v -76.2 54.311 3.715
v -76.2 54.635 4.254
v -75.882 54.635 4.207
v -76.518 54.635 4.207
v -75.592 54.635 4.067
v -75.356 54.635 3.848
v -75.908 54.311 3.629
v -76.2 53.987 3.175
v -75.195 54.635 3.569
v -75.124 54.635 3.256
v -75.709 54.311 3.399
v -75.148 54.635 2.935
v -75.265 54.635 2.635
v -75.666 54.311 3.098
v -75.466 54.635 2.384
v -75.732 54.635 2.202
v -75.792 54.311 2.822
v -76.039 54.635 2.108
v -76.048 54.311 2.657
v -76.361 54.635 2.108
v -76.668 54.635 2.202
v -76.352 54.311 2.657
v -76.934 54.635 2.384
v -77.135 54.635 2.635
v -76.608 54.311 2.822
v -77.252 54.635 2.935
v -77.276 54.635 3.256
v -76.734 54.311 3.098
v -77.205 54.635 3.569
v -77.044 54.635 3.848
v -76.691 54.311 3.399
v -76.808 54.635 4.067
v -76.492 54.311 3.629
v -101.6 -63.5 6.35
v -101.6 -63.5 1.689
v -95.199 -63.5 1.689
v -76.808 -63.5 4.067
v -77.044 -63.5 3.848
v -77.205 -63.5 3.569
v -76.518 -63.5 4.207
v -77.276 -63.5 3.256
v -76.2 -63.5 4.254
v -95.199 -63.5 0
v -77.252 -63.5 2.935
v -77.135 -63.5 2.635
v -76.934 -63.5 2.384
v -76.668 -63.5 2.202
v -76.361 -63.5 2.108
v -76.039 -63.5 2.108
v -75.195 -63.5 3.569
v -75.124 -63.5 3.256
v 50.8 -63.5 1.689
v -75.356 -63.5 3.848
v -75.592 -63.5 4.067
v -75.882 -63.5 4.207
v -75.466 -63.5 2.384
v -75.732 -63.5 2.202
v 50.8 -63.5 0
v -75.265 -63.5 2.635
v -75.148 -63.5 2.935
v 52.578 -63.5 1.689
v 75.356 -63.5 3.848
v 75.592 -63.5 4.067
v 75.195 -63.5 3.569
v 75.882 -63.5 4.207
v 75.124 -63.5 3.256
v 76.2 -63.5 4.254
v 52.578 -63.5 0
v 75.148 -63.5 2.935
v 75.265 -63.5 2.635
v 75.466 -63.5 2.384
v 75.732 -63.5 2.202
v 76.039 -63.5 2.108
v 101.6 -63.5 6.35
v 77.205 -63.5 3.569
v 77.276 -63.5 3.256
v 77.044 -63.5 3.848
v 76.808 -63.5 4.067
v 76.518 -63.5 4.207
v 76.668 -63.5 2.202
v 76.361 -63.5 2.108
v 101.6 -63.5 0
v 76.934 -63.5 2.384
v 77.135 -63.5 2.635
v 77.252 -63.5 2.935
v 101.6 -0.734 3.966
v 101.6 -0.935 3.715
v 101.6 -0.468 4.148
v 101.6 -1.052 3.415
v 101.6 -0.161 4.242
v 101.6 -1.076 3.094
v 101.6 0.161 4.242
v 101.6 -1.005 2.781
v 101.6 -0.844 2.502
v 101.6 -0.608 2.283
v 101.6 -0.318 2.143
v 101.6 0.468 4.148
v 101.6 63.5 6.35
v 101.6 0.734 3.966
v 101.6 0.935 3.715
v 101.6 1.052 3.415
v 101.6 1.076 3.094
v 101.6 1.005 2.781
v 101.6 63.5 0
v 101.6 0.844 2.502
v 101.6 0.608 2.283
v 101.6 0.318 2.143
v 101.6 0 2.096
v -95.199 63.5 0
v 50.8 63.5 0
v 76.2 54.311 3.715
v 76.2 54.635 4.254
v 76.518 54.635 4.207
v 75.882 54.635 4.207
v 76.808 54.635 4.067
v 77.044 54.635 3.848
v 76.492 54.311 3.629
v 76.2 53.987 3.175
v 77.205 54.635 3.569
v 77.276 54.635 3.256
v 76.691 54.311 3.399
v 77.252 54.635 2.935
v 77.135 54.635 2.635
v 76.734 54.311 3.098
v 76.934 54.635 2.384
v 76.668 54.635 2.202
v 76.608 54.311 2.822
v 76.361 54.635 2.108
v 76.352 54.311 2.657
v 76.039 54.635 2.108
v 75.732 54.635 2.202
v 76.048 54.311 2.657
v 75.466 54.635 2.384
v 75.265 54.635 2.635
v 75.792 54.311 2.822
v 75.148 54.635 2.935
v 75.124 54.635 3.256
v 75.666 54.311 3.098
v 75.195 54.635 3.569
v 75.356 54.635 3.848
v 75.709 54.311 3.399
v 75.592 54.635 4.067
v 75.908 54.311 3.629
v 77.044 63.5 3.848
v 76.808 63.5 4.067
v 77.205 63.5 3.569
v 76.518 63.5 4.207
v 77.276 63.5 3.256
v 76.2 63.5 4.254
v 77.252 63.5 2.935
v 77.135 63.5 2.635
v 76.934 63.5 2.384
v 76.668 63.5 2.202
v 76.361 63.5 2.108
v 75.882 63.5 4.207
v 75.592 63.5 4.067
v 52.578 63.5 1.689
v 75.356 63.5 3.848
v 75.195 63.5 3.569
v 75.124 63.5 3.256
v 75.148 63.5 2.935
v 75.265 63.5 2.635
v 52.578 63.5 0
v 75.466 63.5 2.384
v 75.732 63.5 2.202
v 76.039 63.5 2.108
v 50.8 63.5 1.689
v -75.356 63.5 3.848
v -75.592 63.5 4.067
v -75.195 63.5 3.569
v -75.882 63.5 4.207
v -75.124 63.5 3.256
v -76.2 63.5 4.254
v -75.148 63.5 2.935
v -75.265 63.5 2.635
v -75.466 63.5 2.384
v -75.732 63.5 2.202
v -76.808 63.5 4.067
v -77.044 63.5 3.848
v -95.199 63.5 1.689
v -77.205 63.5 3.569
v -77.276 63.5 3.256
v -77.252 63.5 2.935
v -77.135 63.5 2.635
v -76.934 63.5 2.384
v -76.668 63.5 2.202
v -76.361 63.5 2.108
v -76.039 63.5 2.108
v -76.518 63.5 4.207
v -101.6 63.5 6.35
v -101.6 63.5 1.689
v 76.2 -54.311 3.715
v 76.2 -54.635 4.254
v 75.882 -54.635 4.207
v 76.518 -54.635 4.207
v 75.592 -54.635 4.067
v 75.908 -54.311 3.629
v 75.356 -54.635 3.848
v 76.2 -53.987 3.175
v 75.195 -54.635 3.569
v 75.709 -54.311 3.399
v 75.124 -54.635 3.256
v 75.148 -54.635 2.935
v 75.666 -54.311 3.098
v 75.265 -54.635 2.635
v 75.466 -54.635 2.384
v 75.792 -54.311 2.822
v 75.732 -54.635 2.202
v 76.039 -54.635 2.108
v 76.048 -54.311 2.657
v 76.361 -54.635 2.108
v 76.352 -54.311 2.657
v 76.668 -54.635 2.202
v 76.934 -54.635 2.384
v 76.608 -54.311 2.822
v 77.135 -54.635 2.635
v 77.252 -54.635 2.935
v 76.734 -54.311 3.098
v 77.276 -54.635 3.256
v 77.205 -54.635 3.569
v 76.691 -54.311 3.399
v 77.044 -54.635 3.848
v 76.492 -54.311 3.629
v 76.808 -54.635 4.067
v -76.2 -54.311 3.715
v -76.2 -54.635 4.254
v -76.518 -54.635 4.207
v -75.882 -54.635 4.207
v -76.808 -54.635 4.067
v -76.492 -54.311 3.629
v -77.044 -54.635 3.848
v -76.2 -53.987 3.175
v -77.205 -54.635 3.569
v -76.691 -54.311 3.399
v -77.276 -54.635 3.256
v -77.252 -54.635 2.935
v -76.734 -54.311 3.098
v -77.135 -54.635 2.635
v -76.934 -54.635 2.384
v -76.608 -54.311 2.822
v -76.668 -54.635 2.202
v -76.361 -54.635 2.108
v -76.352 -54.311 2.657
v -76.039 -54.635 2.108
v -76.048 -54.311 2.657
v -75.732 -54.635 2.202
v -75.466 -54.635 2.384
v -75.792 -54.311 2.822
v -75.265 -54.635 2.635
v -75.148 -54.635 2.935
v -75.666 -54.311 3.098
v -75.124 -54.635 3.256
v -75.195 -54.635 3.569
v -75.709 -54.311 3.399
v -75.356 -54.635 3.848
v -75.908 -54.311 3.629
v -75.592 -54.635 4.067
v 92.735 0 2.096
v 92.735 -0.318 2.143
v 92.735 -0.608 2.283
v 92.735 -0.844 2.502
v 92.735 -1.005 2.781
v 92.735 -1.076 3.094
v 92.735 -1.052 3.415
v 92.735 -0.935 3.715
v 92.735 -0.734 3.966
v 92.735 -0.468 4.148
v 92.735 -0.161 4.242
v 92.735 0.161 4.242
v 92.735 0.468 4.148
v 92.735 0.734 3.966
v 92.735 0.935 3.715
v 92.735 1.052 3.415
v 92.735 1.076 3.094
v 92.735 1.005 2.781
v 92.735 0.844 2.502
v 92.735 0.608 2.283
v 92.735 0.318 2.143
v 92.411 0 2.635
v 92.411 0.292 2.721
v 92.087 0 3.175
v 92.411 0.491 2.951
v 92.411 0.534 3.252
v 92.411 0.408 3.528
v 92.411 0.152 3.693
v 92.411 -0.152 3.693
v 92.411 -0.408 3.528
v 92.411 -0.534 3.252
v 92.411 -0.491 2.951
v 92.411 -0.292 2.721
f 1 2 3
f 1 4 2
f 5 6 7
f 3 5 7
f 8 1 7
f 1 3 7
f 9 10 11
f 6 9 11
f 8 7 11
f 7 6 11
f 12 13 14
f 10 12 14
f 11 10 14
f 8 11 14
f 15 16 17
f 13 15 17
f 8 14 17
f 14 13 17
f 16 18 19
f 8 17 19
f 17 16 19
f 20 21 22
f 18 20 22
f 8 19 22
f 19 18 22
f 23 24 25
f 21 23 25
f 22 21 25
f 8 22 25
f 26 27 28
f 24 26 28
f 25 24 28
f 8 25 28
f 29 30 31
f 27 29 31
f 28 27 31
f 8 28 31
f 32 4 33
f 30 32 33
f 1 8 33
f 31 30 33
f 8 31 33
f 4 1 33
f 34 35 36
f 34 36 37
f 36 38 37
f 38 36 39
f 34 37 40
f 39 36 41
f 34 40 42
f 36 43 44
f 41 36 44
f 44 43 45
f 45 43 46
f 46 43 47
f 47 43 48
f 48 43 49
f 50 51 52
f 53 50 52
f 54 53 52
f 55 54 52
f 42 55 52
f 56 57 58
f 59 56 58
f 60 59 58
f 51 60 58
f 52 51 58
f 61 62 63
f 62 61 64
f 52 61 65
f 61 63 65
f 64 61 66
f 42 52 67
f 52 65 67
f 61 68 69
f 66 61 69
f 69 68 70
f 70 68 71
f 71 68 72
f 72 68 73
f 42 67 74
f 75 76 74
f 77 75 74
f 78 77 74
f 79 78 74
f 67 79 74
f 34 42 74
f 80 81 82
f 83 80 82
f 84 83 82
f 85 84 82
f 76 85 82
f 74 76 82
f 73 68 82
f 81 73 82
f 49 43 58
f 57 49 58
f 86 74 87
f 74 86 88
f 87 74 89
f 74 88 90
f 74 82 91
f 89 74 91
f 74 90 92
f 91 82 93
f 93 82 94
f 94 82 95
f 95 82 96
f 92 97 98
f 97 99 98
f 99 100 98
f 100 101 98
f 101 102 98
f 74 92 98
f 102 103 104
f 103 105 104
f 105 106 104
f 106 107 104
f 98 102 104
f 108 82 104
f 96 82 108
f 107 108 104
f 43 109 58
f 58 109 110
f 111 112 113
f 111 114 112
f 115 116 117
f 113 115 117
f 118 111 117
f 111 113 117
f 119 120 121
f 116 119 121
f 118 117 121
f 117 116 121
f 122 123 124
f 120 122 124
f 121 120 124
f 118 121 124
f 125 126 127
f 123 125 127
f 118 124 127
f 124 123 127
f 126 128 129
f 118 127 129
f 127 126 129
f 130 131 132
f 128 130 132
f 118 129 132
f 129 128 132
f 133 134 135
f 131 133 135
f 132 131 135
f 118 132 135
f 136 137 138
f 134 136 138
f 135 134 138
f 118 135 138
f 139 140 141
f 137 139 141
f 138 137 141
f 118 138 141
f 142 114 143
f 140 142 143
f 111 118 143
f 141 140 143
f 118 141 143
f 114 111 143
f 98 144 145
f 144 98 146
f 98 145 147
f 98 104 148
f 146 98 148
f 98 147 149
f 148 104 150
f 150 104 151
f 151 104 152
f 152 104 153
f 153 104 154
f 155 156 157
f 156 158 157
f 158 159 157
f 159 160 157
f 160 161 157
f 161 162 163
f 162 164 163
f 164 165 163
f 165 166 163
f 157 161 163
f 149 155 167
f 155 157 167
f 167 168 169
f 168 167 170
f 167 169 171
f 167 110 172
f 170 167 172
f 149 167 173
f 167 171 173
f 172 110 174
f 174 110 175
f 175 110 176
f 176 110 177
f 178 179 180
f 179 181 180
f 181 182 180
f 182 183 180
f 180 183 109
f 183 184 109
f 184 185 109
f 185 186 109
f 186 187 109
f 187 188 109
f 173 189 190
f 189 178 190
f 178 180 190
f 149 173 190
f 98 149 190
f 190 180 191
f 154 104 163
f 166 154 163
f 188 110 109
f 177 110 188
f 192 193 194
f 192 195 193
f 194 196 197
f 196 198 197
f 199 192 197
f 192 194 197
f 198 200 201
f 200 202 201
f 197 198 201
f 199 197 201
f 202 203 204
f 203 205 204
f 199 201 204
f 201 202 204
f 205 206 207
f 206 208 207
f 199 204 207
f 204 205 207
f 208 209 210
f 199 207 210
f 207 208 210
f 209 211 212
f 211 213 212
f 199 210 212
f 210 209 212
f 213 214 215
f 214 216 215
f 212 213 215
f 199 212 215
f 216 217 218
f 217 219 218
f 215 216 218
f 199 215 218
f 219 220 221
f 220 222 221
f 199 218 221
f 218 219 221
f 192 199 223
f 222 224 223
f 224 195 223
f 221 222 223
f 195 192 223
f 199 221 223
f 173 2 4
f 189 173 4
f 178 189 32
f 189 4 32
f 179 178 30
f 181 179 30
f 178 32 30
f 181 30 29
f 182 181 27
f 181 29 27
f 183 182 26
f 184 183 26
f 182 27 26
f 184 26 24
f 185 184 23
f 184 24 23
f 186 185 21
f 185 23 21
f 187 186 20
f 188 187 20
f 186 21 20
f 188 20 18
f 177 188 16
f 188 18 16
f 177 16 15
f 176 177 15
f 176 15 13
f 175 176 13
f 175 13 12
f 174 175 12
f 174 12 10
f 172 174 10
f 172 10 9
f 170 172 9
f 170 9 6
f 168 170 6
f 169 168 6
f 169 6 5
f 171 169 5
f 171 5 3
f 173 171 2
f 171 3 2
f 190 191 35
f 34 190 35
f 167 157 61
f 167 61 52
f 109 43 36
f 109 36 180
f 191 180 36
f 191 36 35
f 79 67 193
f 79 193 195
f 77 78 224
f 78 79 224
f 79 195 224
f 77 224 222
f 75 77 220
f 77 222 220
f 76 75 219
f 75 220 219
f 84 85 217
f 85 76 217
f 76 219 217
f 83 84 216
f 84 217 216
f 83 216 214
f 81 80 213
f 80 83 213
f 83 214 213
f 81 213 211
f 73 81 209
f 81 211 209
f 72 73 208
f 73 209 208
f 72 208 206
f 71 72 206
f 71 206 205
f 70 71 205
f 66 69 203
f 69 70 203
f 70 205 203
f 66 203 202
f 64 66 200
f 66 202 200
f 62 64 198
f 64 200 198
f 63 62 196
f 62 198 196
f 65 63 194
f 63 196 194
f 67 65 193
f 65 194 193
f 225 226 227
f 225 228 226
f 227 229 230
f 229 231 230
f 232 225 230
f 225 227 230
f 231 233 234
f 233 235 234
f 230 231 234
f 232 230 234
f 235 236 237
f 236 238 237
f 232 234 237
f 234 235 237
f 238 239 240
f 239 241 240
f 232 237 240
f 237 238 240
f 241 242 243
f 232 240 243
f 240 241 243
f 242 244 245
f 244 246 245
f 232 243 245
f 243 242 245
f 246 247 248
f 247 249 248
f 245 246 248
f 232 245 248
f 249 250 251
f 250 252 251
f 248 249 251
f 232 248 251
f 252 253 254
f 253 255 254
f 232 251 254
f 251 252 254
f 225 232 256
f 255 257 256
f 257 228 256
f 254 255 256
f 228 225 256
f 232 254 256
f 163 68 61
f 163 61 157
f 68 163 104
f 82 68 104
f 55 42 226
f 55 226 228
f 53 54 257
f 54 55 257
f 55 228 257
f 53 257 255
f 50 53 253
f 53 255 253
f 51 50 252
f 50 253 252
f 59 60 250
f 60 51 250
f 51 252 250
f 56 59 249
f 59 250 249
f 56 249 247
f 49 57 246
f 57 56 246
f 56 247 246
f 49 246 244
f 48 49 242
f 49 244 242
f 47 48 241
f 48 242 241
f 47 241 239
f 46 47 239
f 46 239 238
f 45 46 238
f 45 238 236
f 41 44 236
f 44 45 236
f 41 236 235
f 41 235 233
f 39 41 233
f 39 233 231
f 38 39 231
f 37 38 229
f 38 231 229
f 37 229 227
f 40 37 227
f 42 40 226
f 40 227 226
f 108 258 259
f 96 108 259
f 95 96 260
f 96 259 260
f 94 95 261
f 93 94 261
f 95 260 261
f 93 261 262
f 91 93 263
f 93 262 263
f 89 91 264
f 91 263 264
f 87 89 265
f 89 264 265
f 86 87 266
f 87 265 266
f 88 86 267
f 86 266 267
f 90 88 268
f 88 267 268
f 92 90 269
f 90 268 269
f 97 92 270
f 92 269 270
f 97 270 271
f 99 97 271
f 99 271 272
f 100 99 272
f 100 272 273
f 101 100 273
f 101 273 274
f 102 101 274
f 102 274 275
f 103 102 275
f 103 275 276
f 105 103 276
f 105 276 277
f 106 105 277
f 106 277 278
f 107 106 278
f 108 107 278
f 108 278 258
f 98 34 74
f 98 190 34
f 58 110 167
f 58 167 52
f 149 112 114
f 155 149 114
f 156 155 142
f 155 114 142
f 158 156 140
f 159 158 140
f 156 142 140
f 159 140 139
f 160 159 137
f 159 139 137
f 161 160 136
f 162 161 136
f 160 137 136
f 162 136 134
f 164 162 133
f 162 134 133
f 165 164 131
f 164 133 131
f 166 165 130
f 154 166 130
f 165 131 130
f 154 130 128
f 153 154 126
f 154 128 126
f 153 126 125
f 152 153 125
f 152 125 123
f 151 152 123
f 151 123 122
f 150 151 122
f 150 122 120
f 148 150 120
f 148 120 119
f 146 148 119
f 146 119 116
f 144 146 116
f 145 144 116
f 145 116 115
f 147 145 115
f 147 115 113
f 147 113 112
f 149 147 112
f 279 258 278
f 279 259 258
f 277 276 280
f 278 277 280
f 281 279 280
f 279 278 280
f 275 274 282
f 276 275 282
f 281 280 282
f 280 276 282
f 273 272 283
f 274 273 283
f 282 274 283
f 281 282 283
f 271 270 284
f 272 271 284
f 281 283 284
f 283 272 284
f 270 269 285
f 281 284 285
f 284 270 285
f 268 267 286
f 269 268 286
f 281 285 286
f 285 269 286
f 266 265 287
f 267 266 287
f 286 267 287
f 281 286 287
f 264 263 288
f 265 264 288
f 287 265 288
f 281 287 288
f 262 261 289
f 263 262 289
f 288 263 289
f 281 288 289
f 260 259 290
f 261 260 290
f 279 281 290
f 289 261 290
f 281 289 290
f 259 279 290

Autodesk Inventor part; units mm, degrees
ref_plane "YZ Plane" through (0, 0, 0) normal (1, 0, 0) x (0, 1, 0)
ref_plane "XZ Plane" through (0, 0, 0) normal (0, 1, 0) x (-1, 0, 0)
ref_plane "XY Plane" through (0, 0, 0) normal (0, 0, 1) x (1, 0, 0)
sketch "Sketch1" plane through (0, 0, 0) normal (0, 0, 1) x (1, 0, 0)
  line L0 (-101.6, -63.5) -> (101.6, -63.5)
  line L1 (101.6, -63.5) -> (101.6, 63.5)
  line L2 (101.6, 63.5) -> (-101.6, 63.5)
  line L3 (-101.6, 63.5) -> (-101.6, -63.5)
  line L4 (-101.6, -63.5) -> (101.6, 63.5) construction
  line L5 (101.6, -63.5) -> (-101.6, 63.5) construction
  point P0 (0, 0)
  dimension "d0" = 203.2
  dimension "d1" = 127
extrude "Extrusion1" add sketch "Sketch1" along normal blind 6.35
sketch "Sketch16" plane through (0, 0, 0) normal (0, 0, -1) x (-1, 0, 0)
  line L0 (-101.6, 63.5) -> (101.6, 63.5) projected
  line L1 (101.6, -63.5) -> (-101.6, -63.5) projected
  line L2 (-52.578, 63.5) -> (-50.8, 63.5)
  line L3 (-50.8, 63.5) -> (-50.8, -63.5)
  line L4 (-50.8, -63.5) -> (-52.578, -63.5)
  line L5 (-52.578, -63.5) -> (-52.578, 63.5)
  line L6 (-101.6, -63.5) -> (-101.6, 63.5) projected
  point P0 (0, 0)
  dimension "d114" = 1.778
  dimension "d115" = 49.022
extrude "Extrusion9" cut sketch "Sketch16" against normal blind 1.6891 contours L0 L3 L1 L5
sketch "Sketch17" plane through (-101.6, 63.5, 6.35) normal (0, 1, 0) x (1, 0, 0)
  line L0 (154.178, 6.35) -> (154.178, 4.6609) projected
  line L1 (154.178, 4.6609) -> (152.4, 4.6609) projected
  line L2 (152.4, 4.6609) -> (152.4, 6.35) projected
  line L3 (152.4, 6.35) -> (0, 6.35) projected
  line L4 (0, 6.35) -> (0, 0) projected
  line L5 (203.2, 0) -> (0, 0) projected
  line L6 (203.2, 6.35) -> (203.2, 0) projected
  line L7 (203.2, 6.35) -> (154.178, 6.35) projected
  point P0 (101.6, 6.35)
  point P1 (177.8, 3.175)
  point P2 (25.4, 3.175)
  dimension "d118" = 25.4
  dimension "d119" = 25.4
  dimension "d120" = 3.175
  dimension "d121" = 3.175
hole "Hole7" at (76.2, 63.5, 3.175) at (-76.2, 63.5, 3.175) direction (0, -1, 0) diameter 2.159 depth 8.8646 tip angle 118
mirror "Mirror5" about plane through (0, 0, 0) normal (0, 1, 0) of "Hole7"
sketch "Sketch18" plane through (0, 0, 0) normal (0, 0, -1) x (-1, 0, 0)
  line L0 (-50.8, 63.5) -> (-50.8, -63.5) projected
  line L1 (101.6, -63.5) -> (-50.8, -63.5) projected
  line L2 (101.6, 63.5) -> (101.6, -63.5) projected
  line L3 (-50.8, 63.5) -> (101.6, 63.5) projected
  line L4 (-101.6, 63.5) -> (101.6, 63.5) projected
  line L5 (95.1992, 63.5) -> (101.6508, 63.5)
  line L6 (101.6508, 63.5) -> (101.6508, -63.5)
  line L7 (101.6508, -63.5) -> (95.1992, -63.5)
  line L8 (95.1992, -63.5) -> (95.1992, 63.5)
  point P0 (0, 0)
  dimension "d129" = 6.4516
  dimension "d130" = 152.4508
extrude "Extrusion10" cut sketch "Sketch18" against normal blind 1.6891 contours L3 L2 L1 L8 | L5 L6 L7 L2
sketch "Sketch19" plane through (101.6, -63.5, 0) normal (1, 0, 0) x (0, 0, -1)
  line L0 (0, 0) -> (0, 127) projected
  line L1 (0, 127) -> (-6.35, 127) projected
  line L2 (-6.35, 0) -> (-6.35, 127) projected
  line L3 (0, 0) -> (-6.35, 0) projected
  point P0 (0, 63.5)
  point P1 (-3.175, 63.5)
  dimension "d133" = 3.175
  dimension "d134" = 63.5
hole "Hole8" at (101.6, 0, 3.175) direction (-1, 0, 0) diameter 2.159 depth 8.8646 tip angle 118
equation "\"width\" = 127"
equation "\"depth\" = 203.2"
equation "\"aerogelHolderDepth\" = 49.022"
equation "\"caseThickness\" = 6.35"
equation "\"alignmentGrooveDepth\" = 1.5875"
equation "\"height\" = 127"
equation "\"mirrorAngle\" = 2.5deg"
equation "\"mirrorThickness\" = 3.175"
equation "\"fresnelThickness\" = 0.254"
equation "\"focalLength\" = 152.4"
equation "\"ior\" = 1.49"
equation "\"centerThickness\" = 1.27"
equation "\"fresnelAngle\" = 90deg"
equation "\"fresnelEffectiveDiameter\" = 152.4"
equation "\"alignmentGrooveClearance\" = 0.1016"
equation "\"frontPanelThickness\" = 1.5875"
equation "\"fresnelGrooveWidth\" = 1.778"
properties part number "topBottom" material "Aluminum 6061"
